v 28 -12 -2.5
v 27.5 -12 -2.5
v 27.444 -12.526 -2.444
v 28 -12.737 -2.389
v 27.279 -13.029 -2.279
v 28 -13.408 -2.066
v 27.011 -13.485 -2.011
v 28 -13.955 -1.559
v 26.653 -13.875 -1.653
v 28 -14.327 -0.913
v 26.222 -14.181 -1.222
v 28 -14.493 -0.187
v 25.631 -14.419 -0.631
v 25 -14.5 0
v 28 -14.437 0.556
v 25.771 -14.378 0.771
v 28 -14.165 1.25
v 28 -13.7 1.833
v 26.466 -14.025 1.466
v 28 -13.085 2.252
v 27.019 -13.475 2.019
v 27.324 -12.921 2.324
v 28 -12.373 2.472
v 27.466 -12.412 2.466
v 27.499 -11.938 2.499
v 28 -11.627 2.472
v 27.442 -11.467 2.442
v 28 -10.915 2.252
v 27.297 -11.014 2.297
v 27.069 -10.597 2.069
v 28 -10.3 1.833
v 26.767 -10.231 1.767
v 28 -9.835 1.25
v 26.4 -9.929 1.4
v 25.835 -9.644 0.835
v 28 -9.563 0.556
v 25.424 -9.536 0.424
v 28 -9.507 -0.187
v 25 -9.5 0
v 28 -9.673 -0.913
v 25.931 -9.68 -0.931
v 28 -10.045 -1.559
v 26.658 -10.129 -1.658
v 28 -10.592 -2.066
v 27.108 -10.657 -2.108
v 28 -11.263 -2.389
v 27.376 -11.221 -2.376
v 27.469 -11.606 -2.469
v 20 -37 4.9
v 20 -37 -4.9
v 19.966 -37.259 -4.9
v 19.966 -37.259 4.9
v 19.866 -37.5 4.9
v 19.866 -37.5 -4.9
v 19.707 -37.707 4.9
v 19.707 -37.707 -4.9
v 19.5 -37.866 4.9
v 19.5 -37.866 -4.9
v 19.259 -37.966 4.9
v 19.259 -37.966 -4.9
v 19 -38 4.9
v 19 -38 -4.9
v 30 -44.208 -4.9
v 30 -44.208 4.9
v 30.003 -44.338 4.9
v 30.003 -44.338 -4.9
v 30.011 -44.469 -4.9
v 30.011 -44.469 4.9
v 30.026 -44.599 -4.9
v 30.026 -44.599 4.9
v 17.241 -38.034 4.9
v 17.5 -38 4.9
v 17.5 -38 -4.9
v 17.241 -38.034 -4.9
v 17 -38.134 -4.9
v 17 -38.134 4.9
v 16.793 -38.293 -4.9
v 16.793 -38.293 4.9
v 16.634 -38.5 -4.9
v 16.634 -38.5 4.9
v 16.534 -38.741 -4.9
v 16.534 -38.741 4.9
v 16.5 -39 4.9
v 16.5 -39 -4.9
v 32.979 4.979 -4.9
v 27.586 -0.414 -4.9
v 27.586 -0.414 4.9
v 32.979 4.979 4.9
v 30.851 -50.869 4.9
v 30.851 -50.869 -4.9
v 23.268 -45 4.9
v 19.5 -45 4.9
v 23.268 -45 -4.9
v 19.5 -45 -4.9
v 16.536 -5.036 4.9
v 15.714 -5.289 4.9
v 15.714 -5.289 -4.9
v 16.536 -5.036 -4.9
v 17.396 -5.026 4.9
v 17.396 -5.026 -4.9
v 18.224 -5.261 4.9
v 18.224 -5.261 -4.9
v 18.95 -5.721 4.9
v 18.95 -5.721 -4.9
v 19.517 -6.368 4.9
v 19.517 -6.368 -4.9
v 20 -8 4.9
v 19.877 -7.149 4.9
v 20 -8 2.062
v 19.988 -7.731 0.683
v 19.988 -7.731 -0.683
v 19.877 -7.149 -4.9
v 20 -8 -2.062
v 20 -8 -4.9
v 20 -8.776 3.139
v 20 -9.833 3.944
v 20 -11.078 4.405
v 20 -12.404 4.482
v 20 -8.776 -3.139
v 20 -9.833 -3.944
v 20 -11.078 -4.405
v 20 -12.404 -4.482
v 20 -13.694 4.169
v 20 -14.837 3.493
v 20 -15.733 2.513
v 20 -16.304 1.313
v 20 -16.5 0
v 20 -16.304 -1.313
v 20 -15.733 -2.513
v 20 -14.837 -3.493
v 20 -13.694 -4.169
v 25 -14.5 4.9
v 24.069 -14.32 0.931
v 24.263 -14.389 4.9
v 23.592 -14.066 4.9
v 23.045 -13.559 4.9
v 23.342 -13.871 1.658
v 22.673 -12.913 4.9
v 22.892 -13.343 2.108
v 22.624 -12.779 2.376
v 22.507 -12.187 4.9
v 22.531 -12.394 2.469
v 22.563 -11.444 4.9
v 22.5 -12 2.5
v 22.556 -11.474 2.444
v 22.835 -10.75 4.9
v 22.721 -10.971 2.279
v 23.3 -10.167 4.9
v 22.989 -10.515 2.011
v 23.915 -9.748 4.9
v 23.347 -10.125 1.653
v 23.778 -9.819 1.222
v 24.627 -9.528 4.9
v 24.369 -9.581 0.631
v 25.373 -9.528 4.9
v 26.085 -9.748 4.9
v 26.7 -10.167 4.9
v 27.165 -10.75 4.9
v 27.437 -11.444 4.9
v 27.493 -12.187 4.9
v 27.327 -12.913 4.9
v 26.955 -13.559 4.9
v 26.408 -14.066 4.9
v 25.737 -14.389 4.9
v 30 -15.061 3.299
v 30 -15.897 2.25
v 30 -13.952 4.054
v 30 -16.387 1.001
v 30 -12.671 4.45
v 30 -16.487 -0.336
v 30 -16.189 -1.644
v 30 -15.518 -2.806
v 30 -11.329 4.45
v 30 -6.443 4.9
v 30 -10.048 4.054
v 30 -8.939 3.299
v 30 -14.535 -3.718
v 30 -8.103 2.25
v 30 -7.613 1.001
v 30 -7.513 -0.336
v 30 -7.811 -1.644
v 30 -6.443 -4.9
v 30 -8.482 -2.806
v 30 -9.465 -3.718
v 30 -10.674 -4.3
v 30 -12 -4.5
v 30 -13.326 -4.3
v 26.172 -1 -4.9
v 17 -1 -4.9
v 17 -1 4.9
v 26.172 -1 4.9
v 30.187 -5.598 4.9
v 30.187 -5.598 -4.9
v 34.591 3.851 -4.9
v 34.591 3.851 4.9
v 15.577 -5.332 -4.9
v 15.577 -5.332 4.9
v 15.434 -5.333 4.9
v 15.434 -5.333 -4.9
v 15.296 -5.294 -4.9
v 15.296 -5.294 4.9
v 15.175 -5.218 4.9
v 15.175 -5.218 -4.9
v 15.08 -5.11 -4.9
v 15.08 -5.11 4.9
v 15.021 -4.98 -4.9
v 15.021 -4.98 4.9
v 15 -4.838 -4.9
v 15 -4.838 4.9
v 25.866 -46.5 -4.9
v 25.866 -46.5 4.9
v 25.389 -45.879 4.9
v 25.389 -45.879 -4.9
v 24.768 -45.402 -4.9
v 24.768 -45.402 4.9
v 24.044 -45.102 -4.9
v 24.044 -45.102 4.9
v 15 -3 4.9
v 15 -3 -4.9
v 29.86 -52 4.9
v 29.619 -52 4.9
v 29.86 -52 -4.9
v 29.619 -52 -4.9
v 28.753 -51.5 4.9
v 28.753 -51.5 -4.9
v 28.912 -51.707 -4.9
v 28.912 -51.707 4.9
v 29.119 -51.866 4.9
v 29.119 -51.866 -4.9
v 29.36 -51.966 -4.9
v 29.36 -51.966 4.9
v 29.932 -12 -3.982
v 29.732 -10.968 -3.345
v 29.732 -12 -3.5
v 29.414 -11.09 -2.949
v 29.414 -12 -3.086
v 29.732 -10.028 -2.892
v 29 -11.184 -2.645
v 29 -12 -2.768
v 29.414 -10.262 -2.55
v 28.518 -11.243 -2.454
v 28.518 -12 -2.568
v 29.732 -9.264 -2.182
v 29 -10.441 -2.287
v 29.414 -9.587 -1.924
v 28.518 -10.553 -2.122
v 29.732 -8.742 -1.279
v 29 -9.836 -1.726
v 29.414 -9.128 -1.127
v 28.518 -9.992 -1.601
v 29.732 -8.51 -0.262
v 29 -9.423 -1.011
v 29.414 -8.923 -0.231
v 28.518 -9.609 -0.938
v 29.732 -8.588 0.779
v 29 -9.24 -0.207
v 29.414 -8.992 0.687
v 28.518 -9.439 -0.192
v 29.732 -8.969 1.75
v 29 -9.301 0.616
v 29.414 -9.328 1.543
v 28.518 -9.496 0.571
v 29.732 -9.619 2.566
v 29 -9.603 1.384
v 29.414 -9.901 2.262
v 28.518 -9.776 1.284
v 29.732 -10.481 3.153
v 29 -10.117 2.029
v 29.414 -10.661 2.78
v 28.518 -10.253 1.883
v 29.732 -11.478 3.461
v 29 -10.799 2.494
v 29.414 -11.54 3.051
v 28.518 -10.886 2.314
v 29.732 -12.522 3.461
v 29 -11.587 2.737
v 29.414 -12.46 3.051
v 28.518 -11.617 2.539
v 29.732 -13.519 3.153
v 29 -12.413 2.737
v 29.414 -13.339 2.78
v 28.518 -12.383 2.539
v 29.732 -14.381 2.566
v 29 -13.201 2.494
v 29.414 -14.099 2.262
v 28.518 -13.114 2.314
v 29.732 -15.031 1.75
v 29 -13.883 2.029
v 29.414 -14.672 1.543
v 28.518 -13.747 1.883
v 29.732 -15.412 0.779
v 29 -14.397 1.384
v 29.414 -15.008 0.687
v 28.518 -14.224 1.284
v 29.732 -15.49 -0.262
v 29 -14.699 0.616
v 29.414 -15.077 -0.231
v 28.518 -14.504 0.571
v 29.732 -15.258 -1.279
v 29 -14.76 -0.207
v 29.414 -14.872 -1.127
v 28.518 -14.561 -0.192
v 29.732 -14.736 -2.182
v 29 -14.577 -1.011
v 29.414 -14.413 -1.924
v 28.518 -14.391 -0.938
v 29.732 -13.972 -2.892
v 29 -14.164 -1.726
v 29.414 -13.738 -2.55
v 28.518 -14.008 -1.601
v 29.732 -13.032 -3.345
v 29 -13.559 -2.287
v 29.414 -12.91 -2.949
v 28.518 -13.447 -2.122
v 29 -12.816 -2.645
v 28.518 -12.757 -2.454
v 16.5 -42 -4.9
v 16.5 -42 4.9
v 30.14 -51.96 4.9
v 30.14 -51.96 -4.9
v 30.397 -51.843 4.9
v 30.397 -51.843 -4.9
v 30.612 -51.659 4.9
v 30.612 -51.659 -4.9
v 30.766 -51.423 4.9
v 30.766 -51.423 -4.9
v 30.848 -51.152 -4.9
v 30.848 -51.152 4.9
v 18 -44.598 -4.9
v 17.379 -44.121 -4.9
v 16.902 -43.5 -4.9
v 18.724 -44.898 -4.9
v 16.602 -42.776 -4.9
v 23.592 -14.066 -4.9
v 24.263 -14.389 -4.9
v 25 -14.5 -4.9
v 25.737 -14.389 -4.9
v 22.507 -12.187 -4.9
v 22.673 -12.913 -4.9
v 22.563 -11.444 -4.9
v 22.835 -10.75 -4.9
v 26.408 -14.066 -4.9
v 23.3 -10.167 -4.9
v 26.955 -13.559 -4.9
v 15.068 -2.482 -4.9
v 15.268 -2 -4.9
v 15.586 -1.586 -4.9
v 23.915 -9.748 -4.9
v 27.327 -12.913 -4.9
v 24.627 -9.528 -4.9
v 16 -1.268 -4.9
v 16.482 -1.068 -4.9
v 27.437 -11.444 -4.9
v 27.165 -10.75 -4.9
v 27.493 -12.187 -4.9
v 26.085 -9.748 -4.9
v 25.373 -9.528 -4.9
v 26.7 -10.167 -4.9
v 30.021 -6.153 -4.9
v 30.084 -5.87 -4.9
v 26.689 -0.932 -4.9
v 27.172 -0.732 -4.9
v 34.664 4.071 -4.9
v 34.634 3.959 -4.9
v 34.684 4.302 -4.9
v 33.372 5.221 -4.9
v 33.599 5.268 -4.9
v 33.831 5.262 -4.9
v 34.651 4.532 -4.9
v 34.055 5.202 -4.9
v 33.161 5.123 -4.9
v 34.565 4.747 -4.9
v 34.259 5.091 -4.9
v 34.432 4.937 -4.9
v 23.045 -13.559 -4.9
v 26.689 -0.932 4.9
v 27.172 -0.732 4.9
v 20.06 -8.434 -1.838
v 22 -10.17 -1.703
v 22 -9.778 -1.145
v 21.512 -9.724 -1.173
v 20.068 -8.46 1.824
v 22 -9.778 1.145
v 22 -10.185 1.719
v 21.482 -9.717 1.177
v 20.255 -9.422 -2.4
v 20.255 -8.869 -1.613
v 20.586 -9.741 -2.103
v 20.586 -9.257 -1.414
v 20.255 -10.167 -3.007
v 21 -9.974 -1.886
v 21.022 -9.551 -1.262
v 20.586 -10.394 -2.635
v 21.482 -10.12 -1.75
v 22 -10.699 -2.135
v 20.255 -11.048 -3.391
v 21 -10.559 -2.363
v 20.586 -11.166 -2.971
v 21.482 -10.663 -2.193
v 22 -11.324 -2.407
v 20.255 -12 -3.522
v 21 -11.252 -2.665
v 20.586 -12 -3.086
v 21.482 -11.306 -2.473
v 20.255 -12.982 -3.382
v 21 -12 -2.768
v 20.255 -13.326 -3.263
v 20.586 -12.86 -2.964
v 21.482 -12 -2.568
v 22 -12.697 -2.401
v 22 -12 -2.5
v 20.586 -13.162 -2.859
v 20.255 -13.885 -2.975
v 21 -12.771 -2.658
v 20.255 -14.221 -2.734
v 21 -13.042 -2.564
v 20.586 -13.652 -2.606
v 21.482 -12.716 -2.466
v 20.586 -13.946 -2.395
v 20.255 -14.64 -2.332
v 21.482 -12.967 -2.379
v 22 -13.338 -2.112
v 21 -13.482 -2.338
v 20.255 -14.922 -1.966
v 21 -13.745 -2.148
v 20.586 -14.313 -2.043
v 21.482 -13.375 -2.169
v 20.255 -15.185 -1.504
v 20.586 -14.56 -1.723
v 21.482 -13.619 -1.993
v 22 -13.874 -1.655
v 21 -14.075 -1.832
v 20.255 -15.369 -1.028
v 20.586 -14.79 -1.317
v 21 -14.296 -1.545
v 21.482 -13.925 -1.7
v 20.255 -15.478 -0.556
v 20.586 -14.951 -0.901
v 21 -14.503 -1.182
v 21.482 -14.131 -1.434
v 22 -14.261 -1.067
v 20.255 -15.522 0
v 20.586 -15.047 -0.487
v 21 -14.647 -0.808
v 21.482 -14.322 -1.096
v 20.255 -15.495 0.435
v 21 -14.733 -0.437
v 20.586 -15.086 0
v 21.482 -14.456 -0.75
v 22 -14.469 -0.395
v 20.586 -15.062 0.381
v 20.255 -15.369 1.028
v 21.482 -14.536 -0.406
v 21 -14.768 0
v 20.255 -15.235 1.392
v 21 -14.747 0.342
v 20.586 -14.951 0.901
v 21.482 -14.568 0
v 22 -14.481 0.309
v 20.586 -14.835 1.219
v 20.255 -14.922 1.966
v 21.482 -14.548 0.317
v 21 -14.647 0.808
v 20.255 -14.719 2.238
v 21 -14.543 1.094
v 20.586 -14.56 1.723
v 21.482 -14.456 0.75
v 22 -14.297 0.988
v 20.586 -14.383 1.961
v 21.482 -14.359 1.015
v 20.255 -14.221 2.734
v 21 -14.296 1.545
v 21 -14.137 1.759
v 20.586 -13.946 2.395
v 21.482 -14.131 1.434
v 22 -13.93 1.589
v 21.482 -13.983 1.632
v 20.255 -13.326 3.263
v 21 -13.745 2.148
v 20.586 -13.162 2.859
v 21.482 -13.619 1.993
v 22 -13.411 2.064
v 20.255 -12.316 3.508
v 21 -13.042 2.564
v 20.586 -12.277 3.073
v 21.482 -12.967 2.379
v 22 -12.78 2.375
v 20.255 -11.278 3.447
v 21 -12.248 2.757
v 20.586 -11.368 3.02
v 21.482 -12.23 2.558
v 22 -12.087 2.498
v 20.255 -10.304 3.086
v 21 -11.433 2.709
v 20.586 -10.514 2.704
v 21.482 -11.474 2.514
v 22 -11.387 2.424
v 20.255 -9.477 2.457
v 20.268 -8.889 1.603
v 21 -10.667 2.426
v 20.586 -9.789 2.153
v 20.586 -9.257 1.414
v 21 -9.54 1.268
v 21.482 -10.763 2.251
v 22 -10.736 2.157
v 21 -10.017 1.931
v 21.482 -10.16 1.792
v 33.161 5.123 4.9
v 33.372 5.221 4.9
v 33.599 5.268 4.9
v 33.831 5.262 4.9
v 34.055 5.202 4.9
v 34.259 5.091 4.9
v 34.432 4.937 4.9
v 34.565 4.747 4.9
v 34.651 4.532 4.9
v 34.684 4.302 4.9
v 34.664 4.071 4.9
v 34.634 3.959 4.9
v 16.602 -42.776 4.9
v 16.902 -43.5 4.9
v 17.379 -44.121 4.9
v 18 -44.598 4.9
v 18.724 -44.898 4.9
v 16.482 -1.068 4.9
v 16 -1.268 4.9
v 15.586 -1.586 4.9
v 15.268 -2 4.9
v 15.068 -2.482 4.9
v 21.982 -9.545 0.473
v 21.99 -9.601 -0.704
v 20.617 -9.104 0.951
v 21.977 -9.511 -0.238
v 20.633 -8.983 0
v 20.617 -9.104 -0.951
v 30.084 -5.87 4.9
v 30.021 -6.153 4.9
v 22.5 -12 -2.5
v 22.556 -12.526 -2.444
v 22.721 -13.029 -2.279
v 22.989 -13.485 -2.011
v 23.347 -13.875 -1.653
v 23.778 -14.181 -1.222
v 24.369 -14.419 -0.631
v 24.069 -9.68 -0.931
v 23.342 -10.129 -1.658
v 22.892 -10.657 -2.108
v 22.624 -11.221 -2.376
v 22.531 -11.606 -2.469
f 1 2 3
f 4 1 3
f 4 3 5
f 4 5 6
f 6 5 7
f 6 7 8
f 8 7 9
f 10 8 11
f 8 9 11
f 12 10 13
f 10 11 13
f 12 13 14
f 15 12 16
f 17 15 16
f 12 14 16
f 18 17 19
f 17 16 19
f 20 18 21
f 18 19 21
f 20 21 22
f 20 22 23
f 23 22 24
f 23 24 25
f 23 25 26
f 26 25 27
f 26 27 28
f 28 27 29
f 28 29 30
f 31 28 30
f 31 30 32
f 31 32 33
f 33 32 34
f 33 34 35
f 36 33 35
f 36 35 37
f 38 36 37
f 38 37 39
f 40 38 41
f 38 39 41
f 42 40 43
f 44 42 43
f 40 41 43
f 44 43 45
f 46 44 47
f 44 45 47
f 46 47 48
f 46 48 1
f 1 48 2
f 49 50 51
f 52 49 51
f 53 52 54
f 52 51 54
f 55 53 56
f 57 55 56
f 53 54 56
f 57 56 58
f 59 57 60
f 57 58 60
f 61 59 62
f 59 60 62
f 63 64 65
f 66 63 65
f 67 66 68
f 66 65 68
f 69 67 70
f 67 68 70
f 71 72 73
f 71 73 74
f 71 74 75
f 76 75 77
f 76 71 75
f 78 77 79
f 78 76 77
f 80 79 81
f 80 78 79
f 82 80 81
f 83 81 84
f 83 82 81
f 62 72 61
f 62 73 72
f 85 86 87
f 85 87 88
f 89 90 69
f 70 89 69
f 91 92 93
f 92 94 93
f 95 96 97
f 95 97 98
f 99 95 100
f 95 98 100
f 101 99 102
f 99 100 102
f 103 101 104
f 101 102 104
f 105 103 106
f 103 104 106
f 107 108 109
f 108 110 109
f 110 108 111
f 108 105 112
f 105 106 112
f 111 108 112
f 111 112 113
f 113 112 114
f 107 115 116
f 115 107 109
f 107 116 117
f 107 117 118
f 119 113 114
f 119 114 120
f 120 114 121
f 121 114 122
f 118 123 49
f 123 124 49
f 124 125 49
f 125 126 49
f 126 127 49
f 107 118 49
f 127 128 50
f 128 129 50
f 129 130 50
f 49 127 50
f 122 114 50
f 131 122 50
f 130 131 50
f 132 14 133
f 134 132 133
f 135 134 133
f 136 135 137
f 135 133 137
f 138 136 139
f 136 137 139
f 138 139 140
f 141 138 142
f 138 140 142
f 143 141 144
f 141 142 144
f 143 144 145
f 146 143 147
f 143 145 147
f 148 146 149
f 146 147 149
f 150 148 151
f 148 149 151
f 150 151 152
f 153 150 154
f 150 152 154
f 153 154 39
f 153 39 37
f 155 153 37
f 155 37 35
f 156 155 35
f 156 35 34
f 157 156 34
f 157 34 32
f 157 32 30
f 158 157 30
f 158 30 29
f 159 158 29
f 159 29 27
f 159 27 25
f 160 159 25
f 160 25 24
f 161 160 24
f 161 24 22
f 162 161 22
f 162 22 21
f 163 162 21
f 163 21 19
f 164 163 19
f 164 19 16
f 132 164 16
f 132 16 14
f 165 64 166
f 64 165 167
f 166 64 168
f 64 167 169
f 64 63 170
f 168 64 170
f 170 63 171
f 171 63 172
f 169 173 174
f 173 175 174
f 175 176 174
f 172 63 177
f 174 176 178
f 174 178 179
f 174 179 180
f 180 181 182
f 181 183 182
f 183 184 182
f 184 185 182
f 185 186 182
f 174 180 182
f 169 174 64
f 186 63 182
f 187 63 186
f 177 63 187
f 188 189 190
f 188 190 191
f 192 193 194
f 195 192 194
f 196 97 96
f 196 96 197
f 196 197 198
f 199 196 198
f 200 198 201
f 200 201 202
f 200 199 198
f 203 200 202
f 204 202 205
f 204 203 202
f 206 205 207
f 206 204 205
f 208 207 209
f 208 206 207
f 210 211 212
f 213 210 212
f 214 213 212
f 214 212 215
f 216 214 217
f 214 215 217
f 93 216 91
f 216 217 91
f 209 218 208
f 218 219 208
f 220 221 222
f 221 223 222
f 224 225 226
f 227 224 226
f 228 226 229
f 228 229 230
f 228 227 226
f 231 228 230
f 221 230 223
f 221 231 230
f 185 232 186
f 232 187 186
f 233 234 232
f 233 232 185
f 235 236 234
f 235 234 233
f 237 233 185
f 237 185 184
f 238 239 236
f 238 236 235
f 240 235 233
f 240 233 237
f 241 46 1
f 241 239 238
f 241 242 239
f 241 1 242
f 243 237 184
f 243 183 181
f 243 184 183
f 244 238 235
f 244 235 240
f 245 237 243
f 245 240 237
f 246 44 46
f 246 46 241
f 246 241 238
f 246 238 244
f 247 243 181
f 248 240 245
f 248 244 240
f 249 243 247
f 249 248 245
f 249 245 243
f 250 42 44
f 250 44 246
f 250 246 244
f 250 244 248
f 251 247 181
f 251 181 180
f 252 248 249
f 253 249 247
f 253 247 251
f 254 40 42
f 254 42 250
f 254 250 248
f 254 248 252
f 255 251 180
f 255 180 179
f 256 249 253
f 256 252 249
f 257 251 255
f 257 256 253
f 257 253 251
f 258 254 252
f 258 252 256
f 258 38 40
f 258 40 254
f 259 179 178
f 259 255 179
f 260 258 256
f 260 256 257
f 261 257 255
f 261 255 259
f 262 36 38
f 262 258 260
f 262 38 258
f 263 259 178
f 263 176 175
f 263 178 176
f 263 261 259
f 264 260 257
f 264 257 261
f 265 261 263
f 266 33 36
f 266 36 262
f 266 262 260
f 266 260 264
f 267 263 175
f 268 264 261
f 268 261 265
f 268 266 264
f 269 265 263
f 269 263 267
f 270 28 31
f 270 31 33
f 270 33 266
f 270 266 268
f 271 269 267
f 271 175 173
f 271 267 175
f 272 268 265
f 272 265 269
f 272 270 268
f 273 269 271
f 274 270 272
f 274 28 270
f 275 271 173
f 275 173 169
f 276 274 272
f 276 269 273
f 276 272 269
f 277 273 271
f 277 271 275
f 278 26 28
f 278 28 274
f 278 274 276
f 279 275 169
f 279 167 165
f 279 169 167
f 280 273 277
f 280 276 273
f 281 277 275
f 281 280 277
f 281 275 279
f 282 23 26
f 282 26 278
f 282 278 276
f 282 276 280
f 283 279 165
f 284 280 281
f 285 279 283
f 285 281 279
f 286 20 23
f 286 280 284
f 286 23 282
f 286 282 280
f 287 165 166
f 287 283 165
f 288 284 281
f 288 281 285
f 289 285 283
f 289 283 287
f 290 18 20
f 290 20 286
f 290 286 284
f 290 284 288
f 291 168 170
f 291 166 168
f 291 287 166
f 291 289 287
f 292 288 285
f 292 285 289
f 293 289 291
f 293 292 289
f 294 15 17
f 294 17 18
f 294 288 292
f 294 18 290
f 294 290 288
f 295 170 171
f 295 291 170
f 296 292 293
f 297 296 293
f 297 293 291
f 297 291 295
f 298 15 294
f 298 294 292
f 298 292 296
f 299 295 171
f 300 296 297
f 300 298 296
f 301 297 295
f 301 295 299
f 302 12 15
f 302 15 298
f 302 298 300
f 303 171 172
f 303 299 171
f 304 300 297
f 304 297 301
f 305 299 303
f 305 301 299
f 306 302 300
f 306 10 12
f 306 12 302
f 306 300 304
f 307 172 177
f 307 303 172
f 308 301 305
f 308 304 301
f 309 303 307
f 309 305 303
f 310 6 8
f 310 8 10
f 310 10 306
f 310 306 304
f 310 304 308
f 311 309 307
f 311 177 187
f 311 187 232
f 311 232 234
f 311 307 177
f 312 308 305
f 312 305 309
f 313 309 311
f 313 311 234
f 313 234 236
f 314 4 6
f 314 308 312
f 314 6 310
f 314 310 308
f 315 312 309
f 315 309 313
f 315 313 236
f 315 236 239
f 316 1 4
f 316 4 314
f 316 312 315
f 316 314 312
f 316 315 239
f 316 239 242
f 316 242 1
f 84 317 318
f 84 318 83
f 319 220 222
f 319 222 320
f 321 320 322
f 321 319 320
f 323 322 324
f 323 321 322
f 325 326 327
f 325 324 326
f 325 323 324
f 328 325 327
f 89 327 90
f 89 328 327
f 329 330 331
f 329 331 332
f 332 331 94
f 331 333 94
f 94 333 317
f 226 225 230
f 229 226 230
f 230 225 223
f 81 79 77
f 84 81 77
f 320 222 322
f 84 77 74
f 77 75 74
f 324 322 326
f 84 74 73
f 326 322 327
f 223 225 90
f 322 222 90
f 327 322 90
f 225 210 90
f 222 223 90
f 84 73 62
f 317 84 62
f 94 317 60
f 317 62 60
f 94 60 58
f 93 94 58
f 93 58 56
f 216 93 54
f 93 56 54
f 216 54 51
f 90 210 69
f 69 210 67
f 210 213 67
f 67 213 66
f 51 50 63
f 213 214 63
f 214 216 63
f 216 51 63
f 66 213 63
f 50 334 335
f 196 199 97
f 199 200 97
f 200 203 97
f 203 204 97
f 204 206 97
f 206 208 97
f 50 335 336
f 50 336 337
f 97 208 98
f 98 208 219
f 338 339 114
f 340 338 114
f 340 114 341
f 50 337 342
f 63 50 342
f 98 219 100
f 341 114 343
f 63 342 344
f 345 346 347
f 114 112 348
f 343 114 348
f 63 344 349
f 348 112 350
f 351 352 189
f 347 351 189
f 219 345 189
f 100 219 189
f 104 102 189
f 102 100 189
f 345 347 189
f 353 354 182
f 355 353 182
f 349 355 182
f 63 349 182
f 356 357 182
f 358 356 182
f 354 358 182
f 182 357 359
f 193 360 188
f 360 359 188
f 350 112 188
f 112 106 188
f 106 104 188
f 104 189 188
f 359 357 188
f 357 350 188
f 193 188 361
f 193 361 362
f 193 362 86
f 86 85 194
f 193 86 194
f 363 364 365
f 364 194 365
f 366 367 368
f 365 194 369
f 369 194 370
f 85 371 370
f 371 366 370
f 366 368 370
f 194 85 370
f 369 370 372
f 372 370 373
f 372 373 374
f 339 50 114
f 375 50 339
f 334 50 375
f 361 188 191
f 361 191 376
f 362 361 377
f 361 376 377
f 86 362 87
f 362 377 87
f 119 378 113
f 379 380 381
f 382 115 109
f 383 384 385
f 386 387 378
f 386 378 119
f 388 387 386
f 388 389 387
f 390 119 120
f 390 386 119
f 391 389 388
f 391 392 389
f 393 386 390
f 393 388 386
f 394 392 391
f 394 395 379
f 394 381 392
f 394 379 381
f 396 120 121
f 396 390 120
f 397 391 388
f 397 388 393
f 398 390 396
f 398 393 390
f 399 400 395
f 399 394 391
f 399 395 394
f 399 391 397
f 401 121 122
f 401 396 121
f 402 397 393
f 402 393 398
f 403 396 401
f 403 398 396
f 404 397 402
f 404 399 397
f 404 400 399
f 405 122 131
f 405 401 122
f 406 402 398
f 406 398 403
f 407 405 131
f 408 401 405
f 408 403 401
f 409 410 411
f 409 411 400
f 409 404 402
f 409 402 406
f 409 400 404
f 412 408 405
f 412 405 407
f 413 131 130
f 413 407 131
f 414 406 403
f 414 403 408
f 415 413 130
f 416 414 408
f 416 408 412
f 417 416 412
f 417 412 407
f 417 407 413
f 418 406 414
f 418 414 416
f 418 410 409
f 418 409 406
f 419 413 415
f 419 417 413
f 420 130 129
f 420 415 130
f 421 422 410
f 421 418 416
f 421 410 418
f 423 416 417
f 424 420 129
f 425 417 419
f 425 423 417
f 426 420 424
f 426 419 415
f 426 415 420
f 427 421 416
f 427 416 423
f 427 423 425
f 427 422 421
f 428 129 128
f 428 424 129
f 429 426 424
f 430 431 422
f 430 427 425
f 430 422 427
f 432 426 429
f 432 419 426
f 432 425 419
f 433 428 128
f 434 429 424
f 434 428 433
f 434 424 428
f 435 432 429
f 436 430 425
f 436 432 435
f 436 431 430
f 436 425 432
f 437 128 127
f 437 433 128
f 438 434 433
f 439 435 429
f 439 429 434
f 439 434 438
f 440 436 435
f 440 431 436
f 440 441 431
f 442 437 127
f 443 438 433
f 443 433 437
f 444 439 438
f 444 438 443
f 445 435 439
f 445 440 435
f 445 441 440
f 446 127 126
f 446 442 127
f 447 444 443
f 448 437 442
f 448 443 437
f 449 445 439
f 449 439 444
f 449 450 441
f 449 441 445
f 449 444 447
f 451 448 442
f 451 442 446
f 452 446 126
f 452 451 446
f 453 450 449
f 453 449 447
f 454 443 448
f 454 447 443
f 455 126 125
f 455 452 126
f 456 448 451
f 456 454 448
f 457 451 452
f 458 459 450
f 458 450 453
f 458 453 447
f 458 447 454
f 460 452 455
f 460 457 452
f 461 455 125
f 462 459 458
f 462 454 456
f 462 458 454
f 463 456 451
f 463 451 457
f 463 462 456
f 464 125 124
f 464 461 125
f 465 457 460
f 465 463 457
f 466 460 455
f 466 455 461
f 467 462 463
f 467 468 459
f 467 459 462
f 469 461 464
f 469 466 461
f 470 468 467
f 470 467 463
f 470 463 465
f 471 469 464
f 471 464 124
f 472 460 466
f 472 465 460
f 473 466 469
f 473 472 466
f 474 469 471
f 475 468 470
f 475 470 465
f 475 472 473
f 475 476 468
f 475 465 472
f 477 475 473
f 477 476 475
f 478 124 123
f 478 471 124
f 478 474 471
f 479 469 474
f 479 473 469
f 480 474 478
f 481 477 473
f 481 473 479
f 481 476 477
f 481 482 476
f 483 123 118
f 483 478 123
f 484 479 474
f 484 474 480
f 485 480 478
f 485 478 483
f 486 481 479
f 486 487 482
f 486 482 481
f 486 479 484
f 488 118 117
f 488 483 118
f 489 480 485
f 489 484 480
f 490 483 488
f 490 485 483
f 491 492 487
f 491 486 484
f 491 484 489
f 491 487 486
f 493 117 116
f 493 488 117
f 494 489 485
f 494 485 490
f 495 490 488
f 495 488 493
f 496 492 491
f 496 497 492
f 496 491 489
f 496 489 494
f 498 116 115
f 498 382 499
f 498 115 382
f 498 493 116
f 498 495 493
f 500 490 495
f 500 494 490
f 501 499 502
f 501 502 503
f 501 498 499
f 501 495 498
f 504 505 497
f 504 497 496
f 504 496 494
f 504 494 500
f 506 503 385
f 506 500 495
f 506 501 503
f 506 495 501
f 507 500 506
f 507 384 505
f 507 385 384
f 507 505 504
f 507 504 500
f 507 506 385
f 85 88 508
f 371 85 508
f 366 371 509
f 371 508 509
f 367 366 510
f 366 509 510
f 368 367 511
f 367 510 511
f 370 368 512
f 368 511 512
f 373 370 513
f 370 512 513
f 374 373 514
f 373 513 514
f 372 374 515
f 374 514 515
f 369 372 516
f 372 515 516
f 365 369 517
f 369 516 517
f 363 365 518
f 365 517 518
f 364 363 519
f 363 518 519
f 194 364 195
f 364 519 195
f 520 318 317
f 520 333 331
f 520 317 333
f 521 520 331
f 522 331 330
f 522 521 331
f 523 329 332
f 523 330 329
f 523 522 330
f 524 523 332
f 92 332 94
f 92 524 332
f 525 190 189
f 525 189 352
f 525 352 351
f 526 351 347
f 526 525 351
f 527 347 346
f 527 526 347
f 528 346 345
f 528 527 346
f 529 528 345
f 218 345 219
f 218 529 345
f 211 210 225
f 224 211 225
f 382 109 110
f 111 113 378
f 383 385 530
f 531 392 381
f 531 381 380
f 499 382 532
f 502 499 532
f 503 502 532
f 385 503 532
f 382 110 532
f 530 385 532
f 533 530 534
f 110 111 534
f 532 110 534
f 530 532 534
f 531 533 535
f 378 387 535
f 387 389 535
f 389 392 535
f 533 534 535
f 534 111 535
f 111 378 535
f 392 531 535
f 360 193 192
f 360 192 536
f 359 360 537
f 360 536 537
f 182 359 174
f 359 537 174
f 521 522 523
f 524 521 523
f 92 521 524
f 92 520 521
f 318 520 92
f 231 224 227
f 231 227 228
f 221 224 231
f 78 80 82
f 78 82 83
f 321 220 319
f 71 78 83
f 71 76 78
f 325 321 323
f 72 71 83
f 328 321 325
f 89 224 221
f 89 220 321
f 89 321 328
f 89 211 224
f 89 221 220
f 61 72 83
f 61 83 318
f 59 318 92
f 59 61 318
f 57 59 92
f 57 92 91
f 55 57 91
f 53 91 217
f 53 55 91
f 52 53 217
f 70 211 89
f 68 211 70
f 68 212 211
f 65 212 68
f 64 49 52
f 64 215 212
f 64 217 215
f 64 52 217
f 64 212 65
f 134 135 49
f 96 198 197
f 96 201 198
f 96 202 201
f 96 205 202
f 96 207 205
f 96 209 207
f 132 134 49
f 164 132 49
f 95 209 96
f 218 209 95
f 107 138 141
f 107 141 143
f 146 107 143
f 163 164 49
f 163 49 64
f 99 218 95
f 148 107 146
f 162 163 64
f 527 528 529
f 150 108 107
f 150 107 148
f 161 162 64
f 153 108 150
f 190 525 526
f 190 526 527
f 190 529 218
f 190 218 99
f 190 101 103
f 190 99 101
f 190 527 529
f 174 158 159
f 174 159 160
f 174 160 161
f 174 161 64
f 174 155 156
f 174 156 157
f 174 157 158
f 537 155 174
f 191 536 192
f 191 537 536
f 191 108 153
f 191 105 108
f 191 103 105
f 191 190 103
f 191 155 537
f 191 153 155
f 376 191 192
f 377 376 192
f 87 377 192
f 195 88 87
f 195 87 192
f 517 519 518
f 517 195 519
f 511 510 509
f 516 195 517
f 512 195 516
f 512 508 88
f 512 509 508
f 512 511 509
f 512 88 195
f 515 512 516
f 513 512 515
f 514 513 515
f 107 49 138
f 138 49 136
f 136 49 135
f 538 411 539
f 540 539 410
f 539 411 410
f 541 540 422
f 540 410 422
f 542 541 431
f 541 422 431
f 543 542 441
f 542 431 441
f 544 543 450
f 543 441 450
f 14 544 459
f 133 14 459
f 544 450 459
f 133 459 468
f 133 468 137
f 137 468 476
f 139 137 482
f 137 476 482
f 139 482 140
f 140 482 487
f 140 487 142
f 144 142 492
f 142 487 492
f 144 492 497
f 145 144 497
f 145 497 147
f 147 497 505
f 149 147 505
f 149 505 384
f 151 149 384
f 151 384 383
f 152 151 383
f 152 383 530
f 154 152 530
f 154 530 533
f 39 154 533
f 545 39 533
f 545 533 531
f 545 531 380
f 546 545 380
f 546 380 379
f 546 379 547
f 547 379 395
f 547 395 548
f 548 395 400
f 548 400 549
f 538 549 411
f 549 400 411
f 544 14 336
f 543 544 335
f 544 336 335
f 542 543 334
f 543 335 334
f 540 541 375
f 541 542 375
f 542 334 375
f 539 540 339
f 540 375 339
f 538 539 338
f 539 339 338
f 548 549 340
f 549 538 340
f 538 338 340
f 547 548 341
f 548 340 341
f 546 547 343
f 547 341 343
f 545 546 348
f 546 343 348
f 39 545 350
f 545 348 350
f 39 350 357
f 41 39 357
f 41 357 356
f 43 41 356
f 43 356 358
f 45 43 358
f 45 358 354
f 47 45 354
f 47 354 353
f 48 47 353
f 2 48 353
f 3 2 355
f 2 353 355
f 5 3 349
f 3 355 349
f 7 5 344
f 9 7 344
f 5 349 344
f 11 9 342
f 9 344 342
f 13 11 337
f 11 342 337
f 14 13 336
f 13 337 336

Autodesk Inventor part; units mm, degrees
ref_plane "YZ Plane" through (0, 0, 0) normal (1, 0, 0) x (0, 1, 0)
ref_plane "XZ Plane" through (0, 0, 0) normal (0, 1, 0) x (-1, 0, 0)
ref_plane "XY Plane" through (0, 0, 0) normal (0, 0, 1) x (1, 0, 0)
sketch "Sketch1" plane through (0, 0, 0) normal (0, 0, 1) x (1, 0, 0)
  line L0 (20, -22) -> (4.1, -22) construction
  line L1 (4.1, -22) -> (4.1, -25) construction
  line L2 (4.1, -25) -> (0, -25) construction
  line L3 (30, -47) -> (20, -47) construction
  circle A0 centre (17, -17) radius 3 construction
  line L4 (14, -17) -> (14, 0) construction
  line L5 (14, 0) -> (30, 0) construction
  line L6 (20, -47) -> (20, -17) construction
  line L7 (20, -47) -> (30, -47) construction
  line L8 (30, -47) -> (30, 0) construction
  line L9 (0, -25) -> (0, 0) construction
  line L10 (30, 0) -> (30, -47) construction
  line L11 (-7.0263, 0) -> (42.1581, 0) construction
  line L12 (0, -63.6142) -> (0, 17.6853) construction
  line L13 (17, -17) -> (17, -8) construction
  circle A1 centre (17, -8) radius 3 construction
  line L14 (16.5, -38) -> (20, -38)
  line L15 (16.5, -45) -> (25, -45)
  line L16 (25, -45) -> (29.0415, -52)
  line L17 (29.0415, -52) -> (31, -52)
  line L18 (31, -52) -> (30, -44.4042)
  line L19 (30, -44.4042) -> (30, -1)
  line L20 (15, -1) -> (30, -1)
  line L21 (15, -1) -> (15, -5.7639)
  line L22 (16.5, -45) -> (16.5, -38)
  arc A2 (20, -8) -> (15, -5.7639) centre (17, -8) ccw
  line L23 (20, -8) -> (20, -38)
  line L24 (27, -1) -> (34.0711, 6.0711)
  line L25 (34.0711, 6.0711) -> (35.1317, 5.0104)
  line L26 (30, -6) -> (35.1317, 5.0104)
  point P0 (0, 0)
  point P1 (0, 0)
  dimension "d10" = 6
  dimension "d1" = 3
  dimension "d2" = 5
  dimension "d3" = 14
  dimension "d4" = 20
  dimension "d5" = 22
  dimension "d6" = 30
  dimension "d7" = 4.1
  dimension "d8" = 3
  dimension "d9" = 25
  dimension "d11" = 9
  dimension "d12" = 0
  dimension "d13" = 16
  dimension "d14" = 7
  dimension "d15" = 3.5
  dimension "d16" = 120
  dimension "d17" = 7.5
  dimension "d19" = 5
  dimension "d20" = 5
  dimension "d21" = 1
  dimension "d22" = 1
  dimension "d23" = 1
  dimension "d40" = 45
  dimension "d41" = 3
  dimension "d42" = 10
  dimension "d43" = 5
  dimension "d46" = 1.5
extrude "Extrusion1" add sketch "Sketch1" along normal mid plane 9.8
fillet "Fillet1" radius 0.5 1 edges at (15, -5.7639, 0)
fillet "Fillet2" radius 1 2 edges at (29.0415, -52, 0) (31, -52, 0)
fillet "Fillet3" radius 3 3 edges at (16.5, -45, 0) (25, -45, 0) (30, -44.4042, 0)
fillet "Fillet4" radius 2 1 edges at (15, -1, 0)
fillet "Fillet5" radius 1 1 edges at (20, -38, 0)
sketch "Sketch2" plane through (30, -44.2076, 4.9) normal (1, 0, 0) x (0, 0, -1)
  line L0 (-1.96, 44.2076) -> (11.76, 44.2076) construction
  line L1 (4.9, -19.4066) -> (4.9, 61.8929) construction
  point P0 (4.9, 44.2076)
  point P1 (4.9, 32.2076)
  dimension "d44" = 12
hole "Hole1" at (30, -12, 0) direction (-1, 0, 0) diameter 5 end through all
fillet "Fillet6" radius 2 2 edges at (30, -12, 2.5) (20, -12, 2.5)
fillet "Fillet8" radius 1 2 edges at (34.0711, 6.0711, 0) (35.1317, 5.0104, 0)
fillet "Fillet9" radius 2 1 edges at (27, -1, 0)
fillet "Fillet10" radius 1 1 edges at (16.5, -38, 0)
fillet "Fillet11" radius 2 1 edges at (30, -6, 0)
sketch "Sketch3" plane through (0, 0, 4.9) normal (0, 0, 1) x (1, 0, 0)
  line L0 (-6.9365, 0) -> (41.6191, 0) projected
  line L1 (20, -8) -> (20, -37) projected
  point P0 (0, 0)
  point P1 (20, -12.995)
  point P2 (25, -12)
  dimension "d51" = 12
  dimension "d52" = 5
hole "Hole2" at (25, -12, 4.9) direction (0, 0, -1) diameter 5 end through all
properties part number "P104Levier" material "ABS Plastic"
